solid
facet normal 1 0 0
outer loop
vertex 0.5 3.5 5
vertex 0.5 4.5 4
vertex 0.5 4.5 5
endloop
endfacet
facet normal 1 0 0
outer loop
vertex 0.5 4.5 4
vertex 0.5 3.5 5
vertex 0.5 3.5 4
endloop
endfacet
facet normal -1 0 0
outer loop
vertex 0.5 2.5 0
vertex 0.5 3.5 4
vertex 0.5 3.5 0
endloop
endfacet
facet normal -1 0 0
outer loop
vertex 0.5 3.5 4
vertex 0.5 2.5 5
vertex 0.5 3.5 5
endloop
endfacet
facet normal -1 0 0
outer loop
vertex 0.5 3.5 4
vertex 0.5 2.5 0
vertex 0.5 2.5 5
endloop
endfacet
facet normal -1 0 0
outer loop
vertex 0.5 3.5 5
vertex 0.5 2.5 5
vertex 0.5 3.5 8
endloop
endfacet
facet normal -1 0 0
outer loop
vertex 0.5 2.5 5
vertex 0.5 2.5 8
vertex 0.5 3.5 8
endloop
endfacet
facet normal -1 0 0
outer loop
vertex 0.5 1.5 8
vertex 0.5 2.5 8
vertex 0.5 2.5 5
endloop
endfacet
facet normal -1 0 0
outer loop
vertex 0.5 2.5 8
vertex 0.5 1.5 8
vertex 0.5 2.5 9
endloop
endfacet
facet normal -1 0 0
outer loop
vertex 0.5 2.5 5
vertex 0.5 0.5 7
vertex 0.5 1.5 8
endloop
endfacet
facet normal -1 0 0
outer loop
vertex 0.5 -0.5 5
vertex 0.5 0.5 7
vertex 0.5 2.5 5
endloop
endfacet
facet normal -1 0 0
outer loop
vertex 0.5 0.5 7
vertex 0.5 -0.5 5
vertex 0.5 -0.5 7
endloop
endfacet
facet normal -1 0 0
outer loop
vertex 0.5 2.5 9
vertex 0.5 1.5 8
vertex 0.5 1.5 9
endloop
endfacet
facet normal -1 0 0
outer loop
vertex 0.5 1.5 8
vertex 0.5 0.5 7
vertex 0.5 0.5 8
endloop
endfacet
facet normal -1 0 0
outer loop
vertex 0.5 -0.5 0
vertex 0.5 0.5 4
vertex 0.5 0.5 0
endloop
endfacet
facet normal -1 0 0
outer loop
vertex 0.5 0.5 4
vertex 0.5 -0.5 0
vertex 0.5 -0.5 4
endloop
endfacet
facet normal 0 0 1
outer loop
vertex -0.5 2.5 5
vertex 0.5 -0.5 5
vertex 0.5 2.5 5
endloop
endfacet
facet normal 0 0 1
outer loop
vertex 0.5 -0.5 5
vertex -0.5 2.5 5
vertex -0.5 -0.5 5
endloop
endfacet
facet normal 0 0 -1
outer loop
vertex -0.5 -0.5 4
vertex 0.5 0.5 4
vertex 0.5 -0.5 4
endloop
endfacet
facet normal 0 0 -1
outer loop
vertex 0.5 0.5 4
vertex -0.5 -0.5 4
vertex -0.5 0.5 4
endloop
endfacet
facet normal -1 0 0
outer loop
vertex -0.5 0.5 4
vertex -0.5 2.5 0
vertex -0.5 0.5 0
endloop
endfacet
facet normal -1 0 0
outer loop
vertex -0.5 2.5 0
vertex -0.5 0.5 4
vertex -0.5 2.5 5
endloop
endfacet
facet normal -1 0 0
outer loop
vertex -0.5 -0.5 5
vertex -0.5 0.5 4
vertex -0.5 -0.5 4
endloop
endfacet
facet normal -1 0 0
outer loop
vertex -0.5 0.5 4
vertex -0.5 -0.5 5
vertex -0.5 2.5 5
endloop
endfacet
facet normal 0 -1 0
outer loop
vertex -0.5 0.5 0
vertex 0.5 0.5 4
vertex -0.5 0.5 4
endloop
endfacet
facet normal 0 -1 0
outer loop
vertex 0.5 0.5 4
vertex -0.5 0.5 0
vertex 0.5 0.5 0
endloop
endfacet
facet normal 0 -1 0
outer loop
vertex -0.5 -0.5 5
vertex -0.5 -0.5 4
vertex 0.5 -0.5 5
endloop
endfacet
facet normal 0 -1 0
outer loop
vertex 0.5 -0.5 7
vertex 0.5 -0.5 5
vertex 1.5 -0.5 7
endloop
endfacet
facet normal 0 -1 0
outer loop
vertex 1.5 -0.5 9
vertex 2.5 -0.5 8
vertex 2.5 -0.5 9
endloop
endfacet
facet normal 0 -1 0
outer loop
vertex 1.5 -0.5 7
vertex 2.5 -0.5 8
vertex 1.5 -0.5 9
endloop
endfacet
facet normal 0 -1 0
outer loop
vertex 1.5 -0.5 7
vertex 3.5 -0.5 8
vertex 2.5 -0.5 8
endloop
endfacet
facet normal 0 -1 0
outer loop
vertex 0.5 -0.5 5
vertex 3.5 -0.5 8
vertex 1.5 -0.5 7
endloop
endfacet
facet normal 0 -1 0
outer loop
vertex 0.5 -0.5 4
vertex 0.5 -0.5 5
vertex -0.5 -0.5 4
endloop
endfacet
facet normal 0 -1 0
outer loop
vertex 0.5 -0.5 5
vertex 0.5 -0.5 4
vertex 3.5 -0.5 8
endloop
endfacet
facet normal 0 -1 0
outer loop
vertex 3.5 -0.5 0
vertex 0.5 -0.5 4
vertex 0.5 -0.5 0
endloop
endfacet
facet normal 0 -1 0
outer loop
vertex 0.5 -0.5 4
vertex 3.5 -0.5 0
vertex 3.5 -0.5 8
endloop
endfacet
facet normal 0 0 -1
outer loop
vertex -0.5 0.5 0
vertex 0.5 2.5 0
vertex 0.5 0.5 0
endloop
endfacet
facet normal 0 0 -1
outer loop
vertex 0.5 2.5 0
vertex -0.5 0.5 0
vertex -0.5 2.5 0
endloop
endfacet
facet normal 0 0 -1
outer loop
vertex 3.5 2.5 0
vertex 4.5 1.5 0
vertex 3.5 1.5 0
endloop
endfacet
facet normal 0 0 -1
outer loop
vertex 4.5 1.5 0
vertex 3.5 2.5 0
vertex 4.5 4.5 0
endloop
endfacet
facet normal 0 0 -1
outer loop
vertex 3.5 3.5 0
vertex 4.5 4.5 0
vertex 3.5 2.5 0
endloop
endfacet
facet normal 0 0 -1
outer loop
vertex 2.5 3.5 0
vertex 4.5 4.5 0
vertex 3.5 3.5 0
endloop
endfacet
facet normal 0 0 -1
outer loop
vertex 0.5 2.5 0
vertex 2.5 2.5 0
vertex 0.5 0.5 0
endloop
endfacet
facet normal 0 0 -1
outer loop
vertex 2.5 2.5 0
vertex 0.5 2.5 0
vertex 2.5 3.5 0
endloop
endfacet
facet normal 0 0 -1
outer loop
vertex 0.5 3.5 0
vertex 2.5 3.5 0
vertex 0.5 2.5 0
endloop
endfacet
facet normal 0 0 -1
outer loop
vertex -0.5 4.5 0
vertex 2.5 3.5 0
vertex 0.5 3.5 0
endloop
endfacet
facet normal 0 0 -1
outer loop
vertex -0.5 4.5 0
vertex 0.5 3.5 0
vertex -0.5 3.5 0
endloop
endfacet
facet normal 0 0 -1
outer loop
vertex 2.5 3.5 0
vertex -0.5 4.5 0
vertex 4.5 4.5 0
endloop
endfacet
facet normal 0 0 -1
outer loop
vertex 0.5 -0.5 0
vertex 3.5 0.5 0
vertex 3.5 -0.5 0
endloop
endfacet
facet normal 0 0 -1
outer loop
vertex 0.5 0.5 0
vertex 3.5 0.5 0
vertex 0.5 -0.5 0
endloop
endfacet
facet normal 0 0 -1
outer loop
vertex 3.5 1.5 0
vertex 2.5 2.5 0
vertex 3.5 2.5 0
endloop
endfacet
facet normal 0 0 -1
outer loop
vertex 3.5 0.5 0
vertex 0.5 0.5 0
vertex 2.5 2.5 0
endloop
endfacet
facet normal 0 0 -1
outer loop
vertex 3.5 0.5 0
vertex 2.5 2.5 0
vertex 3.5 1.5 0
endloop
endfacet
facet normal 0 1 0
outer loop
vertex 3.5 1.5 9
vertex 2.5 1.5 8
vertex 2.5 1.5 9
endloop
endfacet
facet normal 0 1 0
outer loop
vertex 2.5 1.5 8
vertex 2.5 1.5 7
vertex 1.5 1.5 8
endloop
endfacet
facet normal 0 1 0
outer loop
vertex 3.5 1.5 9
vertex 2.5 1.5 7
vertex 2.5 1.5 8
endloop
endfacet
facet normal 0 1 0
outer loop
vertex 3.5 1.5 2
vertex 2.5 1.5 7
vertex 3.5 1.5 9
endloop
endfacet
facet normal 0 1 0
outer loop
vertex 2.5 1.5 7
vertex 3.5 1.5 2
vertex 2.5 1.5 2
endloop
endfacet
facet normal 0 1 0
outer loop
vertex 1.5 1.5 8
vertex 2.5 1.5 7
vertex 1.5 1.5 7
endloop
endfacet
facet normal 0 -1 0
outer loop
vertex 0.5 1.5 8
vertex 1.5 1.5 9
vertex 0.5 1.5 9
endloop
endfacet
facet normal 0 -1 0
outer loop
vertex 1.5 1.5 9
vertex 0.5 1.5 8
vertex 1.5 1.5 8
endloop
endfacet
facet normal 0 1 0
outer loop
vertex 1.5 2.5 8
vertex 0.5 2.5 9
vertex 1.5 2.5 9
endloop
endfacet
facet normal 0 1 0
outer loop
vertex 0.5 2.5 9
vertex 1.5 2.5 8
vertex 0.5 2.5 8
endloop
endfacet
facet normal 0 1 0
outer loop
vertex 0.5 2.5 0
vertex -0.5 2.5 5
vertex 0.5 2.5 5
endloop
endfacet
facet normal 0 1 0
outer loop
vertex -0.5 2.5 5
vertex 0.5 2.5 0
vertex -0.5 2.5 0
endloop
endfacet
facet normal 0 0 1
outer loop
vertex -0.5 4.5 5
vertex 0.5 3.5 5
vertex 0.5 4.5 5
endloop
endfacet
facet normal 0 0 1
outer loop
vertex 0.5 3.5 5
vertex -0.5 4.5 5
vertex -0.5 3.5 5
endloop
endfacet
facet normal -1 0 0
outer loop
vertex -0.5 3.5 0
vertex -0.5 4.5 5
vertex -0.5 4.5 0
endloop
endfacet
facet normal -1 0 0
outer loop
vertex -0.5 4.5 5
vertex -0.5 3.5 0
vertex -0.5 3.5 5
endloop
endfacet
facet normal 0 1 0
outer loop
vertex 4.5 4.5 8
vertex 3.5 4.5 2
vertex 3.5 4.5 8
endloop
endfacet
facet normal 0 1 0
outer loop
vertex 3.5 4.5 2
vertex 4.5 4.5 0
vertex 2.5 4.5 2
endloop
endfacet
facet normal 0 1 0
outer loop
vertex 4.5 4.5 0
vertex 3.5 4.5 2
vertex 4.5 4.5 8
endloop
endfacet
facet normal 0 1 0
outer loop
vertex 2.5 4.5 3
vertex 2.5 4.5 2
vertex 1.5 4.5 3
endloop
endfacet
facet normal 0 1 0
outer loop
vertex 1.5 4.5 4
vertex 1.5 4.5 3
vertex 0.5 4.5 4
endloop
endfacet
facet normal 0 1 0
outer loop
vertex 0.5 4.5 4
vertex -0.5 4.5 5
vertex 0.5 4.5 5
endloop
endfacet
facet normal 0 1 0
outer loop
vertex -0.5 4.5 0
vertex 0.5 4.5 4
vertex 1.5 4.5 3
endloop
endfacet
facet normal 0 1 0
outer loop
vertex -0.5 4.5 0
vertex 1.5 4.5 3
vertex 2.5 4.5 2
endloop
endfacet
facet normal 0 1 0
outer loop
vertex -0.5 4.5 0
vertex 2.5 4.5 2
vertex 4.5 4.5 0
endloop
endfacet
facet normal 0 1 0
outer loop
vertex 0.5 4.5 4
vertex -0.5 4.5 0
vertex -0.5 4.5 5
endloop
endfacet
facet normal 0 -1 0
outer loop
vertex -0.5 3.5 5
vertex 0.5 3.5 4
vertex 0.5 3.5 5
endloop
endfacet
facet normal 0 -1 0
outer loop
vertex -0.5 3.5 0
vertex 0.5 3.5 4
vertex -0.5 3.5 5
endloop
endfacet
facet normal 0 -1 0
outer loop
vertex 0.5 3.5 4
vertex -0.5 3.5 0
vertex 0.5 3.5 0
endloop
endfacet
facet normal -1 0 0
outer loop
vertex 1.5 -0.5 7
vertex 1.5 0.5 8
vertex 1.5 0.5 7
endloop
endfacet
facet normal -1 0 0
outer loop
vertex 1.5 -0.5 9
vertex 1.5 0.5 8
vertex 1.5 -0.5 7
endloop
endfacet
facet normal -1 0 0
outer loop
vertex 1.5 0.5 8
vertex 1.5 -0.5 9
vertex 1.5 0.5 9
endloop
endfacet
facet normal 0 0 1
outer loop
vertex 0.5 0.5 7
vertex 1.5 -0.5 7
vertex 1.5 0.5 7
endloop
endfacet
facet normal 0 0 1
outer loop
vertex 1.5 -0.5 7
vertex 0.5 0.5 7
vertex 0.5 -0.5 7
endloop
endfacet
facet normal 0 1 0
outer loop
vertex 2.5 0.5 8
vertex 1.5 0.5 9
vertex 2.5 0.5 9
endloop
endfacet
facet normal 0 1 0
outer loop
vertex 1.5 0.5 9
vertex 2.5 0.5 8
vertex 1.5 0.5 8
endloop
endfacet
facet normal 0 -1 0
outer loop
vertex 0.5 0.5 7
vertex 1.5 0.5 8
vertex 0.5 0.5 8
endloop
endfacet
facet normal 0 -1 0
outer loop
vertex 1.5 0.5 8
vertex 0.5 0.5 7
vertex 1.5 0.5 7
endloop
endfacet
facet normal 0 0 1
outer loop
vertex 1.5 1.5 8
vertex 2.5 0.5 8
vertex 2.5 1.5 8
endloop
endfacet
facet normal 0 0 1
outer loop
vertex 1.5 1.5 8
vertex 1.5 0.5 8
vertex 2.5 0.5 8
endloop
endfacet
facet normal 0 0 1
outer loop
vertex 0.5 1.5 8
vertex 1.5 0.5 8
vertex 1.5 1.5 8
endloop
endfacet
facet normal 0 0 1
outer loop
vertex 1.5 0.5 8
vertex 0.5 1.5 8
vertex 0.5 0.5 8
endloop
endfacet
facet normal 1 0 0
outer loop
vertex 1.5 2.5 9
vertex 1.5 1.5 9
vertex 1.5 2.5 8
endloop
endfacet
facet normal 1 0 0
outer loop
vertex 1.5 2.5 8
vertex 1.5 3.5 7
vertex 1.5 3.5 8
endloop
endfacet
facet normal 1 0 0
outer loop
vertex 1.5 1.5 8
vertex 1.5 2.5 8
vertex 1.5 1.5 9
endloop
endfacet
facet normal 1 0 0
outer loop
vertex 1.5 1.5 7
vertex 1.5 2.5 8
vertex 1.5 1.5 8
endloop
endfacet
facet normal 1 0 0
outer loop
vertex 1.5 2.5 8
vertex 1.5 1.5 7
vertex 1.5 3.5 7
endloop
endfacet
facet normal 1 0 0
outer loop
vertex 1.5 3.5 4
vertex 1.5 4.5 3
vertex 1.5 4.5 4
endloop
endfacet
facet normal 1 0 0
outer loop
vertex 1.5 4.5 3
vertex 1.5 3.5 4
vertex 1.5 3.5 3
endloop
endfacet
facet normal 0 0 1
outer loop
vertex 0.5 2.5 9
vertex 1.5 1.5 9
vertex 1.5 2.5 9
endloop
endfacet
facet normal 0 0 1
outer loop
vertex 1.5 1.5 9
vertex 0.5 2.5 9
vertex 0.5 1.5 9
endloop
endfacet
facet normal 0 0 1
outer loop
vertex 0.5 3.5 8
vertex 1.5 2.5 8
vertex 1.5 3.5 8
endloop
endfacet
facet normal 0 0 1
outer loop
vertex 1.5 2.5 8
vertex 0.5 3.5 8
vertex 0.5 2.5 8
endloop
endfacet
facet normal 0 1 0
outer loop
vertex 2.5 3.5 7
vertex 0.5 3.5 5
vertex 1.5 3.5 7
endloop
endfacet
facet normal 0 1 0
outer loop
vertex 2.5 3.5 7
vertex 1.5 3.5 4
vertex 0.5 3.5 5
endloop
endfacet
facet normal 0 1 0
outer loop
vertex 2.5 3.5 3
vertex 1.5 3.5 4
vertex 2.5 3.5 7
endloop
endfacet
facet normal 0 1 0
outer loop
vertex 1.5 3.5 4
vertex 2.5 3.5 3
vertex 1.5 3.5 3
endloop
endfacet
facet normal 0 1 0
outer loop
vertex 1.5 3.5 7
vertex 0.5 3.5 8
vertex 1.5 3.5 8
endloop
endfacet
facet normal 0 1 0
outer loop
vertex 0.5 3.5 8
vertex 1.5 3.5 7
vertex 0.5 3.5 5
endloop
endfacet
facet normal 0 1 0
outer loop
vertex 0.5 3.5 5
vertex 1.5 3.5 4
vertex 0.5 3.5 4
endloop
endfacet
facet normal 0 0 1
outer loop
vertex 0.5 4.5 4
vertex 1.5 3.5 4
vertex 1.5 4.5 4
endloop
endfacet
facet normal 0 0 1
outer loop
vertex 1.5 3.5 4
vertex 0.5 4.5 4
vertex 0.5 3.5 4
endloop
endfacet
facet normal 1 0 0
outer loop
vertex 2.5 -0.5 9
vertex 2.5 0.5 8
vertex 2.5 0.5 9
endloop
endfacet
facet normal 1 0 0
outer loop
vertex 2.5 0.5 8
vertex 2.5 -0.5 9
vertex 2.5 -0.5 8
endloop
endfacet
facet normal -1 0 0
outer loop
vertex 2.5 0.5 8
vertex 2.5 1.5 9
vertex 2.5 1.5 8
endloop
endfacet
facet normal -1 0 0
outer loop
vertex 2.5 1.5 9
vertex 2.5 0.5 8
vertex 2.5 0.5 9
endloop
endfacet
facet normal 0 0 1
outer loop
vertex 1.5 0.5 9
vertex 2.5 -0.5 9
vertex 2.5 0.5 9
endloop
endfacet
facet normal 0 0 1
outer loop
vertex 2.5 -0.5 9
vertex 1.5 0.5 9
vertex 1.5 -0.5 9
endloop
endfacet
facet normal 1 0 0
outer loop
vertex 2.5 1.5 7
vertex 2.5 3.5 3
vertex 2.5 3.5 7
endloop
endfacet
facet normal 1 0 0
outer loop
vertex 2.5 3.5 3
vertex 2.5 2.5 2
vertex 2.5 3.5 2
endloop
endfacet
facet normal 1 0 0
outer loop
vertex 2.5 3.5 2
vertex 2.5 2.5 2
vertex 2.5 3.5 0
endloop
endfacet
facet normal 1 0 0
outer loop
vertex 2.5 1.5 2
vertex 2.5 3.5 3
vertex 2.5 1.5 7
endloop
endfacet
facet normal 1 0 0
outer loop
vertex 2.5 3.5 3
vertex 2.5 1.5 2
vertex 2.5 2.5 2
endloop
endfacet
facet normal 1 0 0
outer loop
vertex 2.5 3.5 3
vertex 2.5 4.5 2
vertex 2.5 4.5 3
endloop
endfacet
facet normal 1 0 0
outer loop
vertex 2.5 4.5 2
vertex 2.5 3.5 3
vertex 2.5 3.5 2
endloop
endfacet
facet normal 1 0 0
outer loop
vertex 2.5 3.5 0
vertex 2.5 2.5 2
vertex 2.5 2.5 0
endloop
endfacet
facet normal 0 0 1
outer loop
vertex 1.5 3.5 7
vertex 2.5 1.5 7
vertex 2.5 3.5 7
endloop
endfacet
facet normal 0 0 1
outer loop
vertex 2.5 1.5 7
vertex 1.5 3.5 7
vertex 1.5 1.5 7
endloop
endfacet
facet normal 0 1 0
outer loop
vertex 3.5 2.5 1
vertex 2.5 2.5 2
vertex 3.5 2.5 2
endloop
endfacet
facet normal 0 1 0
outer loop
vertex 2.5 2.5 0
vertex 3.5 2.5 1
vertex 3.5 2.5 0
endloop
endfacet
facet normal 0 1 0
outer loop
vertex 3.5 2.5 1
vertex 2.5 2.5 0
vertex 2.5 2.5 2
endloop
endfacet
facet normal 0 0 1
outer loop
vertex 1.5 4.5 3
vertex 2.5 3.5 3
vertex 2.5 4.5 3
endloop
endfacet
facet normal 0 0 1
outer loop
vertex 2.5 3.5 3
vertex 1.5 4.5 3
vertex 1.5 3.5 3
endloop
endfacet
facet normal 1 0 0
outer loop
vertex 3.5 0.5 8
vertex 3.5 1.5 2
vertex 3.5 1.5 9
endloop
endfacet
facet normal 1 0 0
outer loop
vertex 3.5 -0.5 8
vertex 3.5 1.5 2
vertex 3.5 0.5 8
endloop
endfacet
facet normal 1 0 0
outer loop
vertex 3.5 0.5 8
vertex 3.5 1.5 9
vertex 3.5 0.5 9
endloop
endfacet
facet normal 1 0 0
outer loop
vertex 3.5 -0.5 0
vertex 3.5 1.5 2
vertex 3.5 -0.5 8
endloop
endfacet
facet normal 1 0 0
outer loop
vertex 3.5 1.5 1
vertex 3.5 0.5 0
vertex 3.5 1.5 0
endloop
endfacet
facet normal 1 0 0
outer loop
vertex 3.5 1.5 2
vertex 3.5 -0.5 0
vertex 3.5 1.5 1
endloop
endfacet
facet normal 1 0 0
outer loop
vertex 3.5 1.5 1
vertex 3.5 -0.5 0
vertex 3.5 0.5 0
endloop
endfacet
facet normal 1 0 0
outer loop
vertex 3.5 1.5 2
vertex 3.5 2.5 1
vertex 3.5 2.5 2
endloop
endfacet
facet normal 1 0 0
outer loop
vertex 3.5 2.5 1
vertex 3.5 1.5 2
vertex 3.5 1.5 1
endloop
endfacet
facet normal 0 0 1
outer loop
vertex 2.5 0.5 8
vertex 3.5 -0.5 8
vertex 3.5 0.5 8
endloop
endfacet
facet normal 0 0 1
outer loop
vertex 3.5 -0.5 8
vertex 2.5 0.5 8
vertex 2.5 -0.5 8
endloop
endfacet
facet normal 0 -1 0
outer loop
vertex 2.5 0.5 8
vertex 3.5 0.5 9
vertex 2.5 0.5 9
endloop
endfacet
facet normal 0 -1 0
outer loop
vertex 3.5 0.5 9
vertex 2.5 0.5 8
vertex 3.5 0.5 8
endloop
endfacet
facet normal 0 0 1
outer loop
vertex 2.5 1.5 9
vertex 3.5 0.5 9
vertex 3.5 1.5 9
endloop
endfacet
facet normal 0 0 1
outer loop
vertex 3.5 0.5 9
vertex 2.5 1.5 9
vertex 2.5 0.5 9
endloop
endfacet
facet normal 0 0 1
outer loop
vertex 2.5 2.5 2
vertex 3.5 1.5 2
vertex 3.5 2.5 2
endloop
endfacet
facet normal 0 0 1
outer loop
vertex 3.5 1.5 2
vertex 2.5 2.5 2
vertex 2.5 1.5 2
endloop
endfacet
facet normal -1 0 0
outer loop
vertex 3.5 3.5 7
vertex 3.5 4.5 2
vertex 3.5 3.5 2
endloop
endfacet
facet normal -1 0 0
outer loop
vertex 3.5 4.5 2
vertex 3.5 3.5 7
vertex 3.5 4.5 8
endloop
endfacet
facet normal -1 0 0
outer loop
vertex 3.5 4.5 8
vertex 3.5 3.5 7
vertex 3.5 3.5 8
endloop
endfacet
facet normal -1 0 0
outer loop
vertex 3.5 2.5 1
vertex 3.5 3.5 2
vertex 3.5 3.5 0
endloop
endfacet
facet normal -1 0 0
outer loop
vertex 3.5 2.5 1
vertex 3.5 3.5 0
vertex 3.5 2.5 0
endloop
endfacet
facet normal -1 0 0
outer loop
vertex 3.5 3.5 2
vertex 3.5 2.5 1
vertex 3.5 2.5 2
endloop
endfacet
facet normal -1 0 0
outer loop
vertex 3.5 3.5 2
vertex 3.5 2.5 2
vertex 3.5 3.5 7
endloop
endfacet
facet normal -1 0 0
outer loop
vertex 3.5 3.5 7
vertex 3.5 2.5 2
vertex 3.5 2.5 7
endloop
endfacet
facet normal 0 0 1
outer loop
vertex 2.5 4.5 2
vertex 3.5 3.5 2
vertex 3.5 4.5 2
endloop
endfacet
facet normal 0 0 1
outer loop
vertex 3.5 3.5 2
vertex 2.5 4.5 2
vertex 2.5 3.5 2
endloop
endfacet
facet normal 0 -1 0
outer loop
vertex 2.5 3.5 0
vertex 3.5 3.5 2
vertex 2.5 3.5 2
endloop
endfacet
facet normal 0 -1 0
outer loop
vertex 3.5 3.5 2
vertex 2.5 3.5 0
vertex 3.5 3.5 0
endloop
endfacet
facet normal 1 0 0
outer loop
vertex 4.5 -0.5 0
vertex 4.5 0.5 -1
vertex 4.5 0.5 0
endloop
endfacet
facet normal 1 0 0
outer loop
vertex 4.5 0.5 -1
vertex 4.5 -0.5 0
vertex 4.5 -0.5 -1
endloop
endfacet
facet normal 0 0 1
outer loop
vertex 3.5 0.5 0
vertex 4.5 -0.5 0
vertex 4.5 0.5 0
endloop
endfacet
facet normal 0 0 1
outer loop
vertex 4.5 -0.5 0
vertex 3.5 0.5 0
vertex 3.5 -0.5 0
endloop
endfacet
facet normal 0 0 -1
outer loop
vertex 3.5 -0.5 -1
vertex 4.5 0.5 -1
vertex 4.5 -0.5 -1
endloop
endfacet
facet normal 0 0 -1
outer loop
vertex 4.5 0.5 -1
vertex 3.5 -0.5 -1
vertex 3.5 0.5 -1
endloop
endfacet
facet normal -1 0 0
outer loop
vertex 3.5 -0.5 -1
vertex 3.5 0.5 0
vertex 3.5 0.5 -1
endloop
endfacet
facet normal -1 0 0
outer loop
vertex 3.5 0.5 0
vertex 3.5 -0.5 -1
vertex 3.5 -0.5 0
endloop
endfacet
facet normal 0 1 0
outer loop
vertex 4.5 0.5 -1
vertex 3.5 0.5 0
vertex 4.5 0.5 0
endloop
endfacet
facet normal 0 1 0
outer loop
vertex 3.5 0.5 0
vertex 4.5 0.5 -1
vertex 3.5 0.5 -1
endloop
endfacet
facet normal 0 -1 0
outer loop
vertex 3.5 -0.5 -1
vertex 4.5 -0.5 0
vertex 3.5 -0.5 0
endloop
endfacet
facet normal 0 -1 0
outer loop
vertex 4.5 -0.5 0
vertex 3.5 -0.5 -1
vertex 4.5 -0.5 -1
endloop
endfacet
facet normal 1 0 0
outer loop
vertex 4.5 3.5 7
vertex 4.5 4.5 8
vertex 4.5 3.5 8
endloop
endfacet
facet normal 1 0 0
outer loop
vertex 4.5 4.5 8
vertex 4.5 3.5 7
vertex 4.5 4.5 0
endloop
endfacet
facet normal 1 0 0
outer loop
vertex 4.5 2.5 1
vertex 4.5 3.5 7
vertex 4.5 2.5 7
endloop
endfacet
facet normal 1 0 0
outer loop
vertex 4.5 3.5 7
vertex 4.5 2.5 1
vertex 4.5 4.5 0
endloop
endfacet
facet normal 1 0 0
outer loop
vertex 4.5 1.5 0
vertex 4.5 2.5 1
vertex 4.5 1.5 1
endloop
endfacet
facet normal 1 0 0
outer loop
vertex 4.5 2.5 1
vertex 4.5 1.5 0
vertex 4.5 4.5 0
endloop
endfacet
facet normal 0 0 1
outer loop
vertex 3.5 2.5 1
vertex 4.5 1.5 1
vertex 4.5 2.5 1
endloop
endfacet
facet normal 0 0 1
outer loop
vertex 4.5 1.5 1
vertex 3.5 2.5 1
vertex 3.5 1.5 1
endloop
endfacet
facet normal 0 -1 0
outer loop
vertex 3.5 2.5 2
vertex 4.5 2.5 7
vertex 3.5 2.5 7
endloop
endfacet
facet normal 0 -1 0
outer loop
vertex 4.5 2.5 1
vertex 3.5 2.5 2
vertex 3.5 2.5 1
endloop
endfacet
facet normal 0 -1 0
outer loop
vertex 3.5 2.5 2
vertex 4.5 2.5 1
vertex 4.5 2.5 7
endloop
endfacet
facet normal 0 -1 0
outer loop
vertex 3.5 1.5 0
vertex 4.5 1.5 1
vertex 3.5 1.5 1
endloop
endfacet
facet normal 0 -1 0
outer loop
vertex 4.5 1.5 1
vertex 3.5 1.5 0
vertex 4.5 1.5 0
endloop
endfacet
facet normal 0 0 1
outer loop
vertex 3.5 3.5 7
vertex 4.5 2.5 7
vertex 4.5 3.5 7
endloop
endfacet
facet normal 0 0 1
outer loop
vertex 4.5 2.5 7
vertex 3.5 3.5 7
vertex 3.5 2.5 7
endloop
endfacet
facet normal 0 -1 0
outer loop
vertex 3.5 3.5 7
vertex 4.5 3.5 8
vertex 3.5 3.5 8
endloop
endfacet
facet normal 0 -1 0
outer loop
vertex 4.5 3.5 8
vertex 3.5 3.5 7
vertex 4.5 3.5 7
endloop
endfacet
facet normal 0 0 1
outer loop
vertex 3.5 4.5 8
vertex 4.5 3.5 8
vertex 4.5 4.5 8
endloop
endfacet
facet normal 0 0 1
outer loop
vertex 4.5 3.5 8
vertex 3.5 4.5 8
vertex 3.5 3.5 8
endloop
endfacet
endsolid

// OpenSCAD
union() {
    translate([0, 0, 4.5]) color([1, 0, 0]) cube([1, 1, 1], center=true);
    translate([0, 1, 2.5]) cube([1, 1, 5], center=true);
    translate([0, 2, 2.5]) cube([1, 1, 5], center=true);
    translate([0, 4, 2.5]) cube([1, 1, 5], center=true);
    translate([1, 0, 3.5]) cube([1, 1, 7], center=true);
    translate([1, 1, 4.0]) cube([1, 1, 8], center=true);
    translate([1, 2, 4.5]) cube([1, 1, 9], center=true);
    translate([1, 3, 4.0]) cube([1, 1, 8], center=true);
    translate([1, 4, 2.0]) cube([1, 1, 4], center=true);
    translate([2, 0, 4.5]) cube([1, 1, 9], center=true);
    translate([2, 1, 4.0]) cube([1, 1, 8], center=true);
    translate([2, 2, 3.5]) cube([1, 1, 7], center=true);
    translate([2, 3, 3.5]) cube([1, 1, 7], center=true);
    translate([2, 4, 1.5]) cube([1, 1, 3], center=true);
    translate([3, 0, 4.0]) cube([1, 1, 8], center=true);
    translate([3, 1, 4.5]) cube([1, 1, 9], center=true);
    translate([3, 2, 1.0]) cube([1, 1, 2], center=true);
    translate([3, 4, 1.0]) cube([1, 1, 2], center=true);
    translate([4, 0, -0.5]) color([0, 0, 1]) cube([1, 1, 1], center=true);
    translate([4, 2, 0.5]) cube([1, 1, 1], center=true);
    translate([4, 3, 3.5]) cube([1, 1, 7], center=true);
    translate([4, 4, 4.0]) cube([1, 1, 8], center=true);
}
